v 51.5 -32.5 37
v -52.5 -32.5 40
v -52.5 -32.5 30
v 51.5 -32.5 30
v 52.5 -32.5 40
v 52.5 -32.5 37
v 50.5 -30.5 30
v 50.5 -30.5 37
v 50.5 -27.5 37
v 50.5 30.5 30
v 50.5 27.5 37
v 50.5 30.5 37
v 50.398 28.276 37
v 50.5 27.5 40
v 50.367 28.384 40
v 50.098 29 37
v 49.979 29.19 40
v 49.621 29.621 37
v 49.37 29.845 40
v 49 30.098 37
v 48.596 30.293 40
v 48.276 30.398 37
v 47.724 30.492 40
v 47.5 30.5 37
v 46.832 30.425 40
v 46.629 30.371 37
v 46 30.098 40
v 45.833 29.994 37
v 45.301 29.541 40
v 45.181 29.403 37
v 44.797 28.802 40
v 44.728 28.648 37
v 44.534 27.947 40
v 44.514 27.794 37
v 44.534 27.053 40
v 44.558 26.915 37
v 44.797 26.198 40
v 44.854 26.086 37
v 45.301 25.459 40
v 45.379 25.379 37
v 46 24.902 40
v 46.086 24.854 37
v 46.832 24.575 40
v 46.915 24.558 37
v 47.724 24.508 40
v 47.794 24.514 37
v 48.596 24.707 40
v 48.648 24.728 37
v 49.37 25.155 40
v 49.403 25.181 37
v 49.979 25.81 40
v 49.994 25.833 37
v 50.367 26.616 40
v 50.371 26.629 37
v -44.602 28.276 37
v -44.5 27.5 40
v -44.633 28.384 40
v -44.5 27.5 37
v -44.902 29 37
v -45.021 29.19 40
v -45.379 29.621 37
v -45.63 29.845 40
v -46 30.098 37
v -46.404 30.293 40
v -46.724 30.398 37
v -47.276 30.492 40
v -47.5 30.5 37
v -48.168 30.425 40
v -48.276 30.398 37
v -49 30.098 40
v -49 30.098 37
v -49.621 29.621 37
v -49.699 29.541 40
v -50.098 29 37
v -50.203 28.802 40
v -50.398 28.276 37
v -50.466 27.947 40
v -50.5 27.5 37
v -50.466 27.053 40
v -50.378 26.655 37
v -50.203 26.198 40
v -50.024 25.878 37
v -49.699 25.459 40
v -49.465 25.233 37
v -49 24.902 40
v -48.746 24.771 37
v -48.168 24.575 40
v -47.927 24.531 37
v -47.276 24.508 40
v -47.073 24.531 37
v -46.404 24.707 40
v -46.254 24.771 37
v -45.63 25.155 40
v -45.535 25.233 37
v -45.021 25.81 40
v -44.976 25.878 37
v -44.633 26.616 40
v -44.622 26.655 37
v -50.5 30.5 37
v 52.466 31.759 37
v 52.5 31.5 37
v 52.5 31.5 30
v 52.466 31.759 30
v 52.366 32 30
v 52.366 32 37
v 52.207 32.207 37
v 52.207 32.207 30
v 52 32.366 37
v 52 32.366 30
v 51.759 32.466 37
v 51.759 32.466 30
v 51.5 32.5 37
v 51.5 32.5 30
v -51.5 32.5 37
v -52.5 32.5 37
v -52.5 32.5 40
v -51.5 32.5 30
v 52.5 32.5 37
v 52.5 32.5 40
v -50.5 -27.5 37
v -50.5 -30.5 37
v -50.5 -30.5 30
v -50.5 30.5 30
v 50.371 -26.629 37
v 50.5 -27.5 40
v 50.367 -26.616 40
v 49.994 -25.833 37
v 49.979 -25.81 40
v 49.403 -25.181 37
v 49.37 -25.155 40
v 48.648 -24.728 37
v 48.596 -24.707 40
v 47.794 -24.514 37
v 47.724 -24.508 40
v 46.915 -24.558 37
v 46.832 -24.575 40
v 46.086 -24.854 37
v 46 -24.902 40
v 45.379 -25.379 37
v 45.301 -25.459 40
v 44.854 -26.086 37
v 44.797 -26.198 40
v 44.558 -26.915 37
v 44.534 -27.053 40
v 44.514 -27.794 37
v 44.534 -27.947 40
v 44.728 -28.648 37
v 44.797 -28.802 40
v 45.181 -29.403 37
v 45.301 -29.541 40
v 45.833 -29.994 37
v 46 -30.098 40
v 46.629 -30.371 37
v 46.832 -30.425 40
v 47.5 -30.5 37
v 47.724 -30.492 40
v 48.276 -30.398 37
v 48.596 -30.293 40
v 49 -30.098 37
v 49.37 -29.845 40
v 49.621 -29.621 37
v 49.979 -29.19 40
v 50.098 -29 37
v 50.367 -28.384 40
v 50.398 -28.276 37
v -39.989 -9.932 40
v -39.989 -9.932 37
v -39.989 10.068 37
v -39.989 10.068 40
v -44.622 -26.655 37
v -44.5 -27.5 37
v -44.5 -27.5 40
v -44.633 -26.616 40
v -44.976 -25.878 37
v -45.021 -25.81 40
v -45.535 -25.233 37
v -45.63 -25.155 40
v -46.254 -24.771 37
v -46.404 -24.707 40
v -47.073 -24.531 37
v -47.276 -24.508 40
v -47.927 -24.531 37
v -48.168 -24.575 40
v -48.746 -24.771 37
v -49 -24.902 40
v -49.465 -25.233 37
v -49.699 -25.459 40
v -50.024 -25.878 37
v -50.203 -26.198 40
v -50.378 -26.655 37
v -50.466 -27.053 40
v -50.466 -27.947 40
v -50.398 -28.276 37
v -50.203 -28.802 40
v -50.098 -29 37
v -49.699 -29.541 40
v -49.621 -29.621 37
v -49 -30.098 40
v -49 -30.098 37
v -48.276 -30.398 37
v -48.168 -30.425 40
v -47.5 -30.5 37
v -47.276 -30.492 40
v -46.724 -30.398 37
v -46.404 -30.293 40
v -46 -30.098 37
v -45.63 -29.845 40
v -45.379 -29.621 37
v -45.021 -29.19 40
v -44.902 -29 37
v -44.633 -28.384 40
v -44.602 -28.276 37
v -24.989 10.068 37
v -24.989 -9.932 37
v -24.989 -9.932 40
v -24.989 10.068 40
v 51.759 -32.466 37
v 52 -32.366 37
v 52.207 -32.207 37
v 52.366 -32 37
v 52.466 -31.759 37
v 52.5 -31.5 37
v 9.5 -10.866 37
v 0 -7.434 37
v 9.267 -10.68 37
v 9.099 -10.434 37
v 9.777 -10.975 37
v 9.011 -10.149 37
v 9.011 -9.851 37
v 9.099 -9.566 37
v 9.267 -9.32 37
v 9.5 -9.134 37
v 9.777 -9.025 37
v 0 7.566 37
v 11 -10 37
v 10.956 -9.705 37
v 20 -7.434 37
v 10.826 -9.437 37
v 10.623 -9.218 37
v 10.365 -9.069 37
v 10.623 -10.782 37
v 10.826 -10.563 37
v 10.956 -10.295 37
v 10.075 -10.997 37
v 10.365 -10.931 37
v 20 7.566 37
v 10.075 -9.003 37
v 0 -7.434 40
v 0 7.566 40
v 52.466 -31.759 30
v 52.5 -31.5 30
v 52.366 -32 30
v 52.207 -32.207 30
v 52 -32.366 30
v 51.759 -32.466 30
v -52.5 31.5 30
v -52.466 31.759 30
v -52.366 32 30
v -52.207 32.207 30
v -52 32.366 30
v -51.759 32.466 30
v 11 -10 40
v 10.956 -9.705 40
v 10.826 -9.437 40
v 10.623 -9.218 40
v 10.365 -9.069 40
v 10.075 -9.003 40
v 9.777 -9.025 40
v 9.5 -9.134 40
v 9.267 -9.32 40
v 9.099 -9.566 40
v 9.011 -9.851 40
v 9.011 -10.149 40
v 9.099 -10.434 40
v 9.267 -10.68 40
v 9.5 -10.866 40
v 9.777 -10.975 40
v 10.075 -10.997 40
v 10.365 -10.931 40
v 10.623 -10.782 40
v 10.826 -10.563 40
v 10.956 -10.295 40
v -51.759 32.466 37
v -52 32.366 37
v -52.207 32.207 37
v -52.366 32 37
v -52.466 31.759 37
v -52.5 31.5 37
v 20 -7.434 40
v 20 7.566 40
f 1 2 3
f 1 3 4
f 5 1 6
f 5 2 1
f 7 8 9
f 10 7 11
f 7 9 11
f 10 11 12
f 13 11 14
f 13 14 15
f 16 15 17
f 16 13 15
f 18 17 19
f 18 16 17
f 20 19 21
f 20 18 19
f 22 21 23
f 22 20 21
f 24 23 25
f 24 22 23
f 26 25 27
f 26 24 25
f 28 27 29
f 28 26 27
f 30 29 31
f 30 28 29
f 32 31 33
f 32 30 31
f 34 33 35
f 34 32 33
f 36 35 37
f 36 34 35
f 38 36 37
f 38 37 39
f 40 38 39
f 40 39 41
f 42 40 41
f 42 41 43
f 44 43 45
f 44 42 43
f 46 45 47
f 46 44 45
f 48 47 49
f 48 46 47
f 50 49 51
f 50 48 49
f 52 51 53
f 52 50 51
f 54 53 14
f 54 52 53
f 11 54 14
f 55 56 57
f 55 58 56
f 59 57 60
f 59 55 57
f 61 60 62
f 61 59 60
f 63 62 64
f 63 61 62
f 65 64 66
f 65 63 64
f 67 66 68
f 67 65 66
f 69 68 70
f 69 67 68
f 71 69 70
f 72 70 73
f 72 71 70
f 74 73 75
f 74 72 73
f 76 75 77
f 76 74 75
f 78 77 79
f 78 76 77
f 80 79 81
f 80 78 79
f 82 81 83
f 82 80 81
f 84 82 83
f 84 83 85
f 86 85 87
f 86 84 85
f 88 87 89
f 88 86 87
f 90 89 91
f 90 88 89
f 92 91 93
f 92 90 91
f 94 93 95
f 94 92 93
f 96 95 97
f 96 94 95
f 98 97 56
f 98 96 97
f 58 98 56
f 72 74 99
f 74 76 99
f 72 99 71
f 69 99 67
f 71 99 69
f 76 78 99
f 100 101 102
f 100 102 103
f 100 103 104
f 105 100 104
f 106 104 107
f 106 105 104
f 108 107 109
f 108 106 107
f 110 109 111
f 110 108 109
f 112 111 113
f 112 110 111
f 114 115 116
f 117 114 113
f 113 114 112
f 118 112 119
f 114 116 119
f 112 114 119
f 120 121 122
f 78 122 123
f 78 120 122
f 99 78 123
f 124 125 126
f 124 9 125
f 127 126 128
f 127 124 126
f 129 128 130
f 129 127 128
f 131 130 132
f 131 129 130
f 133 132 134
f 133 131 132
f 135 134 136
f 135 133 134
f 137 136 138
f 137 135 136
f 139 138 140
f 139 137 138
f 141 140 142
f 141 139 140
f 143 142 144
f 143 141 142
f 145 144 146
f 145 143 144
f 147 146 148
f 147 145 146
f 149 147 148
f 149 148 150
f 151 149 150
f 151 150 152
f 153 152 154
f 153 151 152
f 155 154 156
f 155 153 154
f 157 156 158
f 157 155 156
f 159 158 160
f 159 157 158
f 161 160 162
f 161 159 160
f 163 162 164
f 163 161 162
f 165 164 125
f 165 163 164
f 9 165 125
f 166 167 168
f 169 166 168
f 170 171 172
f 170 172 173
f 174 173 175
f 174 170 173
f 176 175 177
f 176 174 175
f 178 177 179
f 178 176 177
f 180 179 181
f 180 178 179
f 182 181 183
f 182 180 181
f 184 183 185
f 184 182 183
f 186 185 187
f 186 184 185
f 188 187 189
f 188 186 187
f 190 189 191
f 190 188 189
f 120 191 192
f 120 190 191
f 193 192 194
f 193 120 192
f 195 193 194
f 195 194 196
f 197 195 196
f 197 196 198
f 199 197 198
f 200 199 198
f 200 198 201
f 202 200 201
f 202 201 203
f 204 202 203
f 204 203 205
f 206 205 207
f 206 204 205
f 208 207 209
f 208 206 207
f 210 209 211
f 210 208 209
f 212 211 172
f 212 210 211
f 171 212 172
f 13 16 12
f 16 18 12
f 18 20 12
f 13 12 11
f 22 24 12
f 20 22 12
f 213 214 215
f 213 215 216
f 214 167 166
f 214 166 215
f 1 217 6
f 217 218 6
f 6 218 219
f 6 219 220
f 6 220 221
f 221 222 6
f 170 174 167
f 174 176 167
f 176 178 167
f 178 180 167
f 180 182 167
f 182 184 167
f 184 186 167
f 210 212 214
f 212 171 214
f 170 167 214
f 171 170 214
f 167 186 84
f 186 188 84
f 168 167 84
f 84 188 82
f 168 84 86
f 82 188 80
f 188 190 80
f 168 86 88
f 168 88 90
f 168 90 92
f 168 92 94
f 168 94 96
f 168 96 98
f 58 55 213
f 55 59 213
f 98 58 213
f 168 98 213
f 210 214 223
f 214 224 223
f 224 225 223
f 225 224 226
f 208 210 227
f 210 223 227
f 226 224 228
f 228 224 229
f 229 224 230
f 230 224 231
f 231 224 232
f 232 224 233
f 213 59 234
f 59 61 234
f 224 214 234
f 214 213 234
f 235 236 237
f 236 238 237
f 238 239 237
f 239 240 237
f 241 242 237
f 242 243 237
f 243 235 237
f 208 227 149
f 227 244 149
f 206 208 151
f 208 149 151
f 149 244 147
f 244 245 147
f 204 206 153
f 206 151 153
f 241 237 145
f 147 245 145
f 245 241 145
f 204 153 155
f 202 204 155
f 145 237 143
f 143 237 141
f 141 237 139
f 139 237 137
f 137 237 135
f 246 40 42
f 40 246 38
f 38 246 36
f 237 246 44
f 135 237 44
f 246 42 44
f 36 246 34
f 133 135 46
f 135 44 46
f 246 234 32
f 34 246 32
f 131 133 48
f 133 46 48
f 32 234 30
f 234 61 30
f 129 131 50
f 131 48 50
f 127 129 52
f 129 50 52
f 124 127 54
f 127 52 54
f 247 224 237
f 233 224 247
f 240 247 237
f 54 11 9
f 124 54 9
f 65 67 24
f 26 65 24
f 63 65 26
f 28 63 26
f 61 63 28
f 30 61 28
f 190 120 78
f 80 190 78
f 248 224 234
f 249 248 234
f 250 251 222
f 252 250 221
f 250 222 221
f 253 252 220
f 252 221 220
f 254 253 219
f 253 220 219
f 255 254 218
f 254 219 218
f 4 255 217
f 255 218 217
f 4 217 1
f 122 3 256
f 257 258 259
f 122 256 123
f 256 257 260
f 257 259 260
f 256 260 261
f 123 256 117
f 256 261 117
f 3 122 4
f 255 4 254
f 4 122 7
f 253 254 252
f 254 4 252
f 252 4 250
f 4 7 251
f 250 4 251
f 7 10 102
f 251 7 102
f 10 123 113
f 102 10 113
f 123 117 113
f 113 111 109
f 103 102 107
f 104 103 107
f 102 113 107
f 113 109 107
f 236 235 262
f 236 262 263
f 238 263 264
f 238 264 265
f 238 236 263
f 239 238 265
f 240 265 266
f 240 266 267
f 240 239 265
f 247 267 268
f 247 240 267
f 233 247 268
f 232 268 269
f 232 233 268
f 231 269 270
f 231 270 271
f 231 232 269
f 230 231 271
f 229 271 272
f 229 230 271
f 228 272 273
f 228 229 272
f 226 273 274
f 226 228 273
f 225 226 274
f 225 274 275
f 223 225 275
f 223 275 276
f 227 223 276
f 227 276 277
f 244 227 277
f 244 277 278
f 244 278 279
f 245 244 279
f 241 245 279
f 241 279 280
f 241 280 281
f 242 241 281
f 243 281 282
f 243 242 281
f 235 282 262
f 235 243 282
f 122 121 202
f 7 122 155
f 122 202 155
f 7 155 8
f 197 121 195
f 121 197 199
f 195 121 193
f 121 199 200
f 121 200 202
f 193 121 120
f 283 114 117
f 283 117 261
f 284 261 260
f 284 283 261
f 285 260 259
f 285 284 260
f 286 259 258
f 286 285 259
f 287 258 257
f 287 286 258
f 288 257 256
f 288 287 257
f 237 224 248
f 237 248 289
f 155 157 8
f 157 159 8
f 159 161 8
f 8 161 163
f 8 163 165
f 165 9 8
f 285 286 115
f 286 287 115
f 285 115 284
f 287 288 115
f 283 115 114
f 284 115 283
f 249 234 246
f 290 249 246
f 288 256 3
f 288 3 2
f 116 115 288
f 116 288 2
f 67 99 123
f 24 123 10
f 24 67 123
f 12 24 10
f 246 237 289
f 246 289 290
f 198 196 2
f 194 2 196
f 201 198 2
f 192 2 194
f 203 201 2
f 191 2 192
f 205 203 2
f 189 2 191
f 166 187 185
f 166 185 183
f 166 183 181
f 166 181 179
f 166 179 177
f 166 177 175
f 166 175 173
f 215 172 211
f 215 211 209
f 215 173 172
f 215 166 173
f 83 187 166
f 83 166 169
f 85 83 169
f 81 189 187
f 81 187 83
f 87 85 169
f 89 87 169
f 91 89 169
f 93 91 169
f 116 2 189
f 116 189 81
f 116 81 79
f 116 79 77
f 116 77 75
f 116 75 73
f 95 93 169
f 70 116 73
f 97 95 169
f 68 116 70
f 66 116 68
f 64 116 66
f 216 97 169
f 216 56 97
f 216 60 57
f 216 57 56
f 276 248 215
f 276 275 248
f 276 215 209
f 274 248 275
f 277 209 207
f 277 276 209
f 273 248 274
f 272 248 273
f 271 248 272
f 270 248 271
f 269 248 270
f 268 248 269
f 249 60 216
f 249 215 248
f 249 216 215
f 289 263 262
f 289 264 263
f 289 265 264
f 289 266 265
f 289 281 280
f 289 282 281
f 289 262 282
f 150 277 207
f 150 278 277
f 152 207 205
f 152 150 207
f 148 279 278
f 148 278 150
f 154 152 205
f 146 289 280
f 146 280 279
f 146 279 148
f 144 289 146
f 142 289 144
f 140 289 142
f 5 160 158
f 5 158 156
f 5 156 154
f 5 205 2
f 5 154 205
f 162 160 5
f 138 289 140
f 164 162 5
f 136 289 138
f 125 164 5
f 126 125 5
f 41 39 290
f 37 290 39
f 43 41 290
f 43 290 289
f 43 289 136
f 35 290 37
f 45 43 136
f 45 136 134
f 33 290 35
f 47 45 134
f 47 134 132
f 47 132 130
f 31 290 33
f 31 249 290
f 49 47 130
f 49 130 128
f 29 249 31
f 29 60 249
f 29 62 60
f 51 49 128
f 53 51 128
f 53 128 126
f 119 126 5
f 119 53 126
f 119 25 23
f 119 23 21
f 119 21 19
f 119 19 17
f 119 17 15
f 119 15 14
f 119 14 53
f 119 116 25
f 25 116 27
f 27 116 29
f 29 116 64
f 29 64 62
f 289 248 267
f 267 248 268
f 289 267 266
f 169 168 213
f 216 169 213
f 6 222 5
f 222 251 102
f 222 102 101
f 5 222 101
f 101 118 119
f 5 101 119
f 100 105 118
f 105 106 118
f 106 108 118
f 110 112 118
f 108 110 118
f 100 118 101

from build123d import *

# Parameters (mm, degrees)
SKETCH007_W   = 105
SKETCH007_H   = 10
PAD006_DEPTH  = 2
FILLET006_R   = 1
SKETCH008_W   = 105
SKETCH008_H   = 10
PAD007_DEPTH  = 2
FILLET012_R   = 1
FILLET014_R   = 1
FILLET023_R   = 1
SKETCH009_W   = 65
SKETCH009_H   = 10
PAD008_DEPTH  = 2
FILLET013_R   = 1
FILLET020_R   = 1
FILLET027_R   = 1
SKETCH010_W   = 65
SKETCH010_H   = 10
PAD009_DEPTH  = 2
FILLET007_R   = 1
FILLET011_R   = 1
FILLET025_R   = 1
SKETCH006_W   = 105
SKETCH006_H   = 65
SKETCH006_R   = 3
SKETCH006_R_2 = 1
SKETCH006_W_2 = 15
SKETCH006_H_2 = 20
SKETCH006_W_3 = 20
SKETCH006_H_3 = 15
PAD005_DEPTH  = 3


with BuildPart() as body006:
    # Sketch007 → Pad006 (new body)
    with BuildSketch(Plane.XZ):
        with Locations((0, 5)):
            Rectangle(SKETCH007_W, SKETCH007_H)
    extrude(amount=PAD006_DEPTH)

    # Fillet006
    fillet006_edges = [body006.edges().sort_by_distance(p)[0] for p in [
        (52.5, -2, 5),
    ]]
    fillet(fillet006_edges, radius=FILLET006_R)


with BuildPart() as body006_1:
    # Body006 placement: moved
    add(body006.part.moved(Location((0, -30.5, 36))))


with BuildPart() as body007:
    # Sketch008 → Pad007 (new body)
    with BuildSketch(Plane.XZ):
        with Locations((0, 5)):
            Rectangle(SKETCH008_W, SKETCH008_H)
    extrude(amount=PAD007_DEPTH)

    # Fillet012
    fillet012_edges = [body007.edges().sort_by_distance(p)[0] for p in [
        (52.5, 0, 5),
    ]]
    fillet(fillet012_edges, radius=FILLET012_R)

    # Fillet014
    fillet014_edges = [body007.edges().sort_by_distance(p)[0] for p in [
        (-52.5, 0, 5),
    ]]
    fillet(fillet014_edges, radius=FILLET014_R)

    # Fillet023
    fillet023_edges = [body007.edges().sort_by_distance(p)[0] for p in [
        (0, 0, 10),
    ]]
    fillet(fillet023_edges, radius=FILLET023_R)


with BuildPart() as body007_1:
    # Body007 placement: moved
    add(body007.part.moved(Location((0, 32.5, 36))))


with BuildPart() as body008:
    # Sketch009 → Pad008 (new body)
    with BuildSketch(Plane.YZ):
        with Locations((0, 5)):
            Rectangle(SKETCH009_W, SKETCH009_H)
    extrude(amount=PAD008_DEPTH)

    # Fillet013
    fillet013_edges = [body008.edges().sort_by_distance(p)[0] for p in [
        (0, 32.5, 5),
    ]]
    fillet(fillet013_edges, radius=FILLET013_R)

    # Fillet020
    fillet020_edges = [body008.edges().sort_by_distance(p)[0] for p in [
        (0, -32.5, 5),
    ]]
    fillet(fillet020_edges, radius=FILLET020_R)

    # Fillet027
    fillet027_edges = [body008.edges().sort_by_distance(p)[0] for p in [
        (0, 0, 10),
    ]]
    fillet(fillet027_edges, radius=FILLET027_R)


with BuildPart() as body008_1:
    # Body008 placement: moved
    add(body008.part.moved(Location((-52.5, 0, 36))))


with BuildPart() as body009:
    # Sketch010 → Pad009 (new body)
    with BuildSketch(Plane.YZ):
        with Locations((0, 5)):
            Rectangle(SKETCH010_W, SKETCH010_H)
    extrude(amount=PAD009_DEPTH)

    # Fillet007
    fillet007_edges = [body009.edges().sort_by_distance(p)[0] for p in [
        (2, -32.5, 5),
    ]]
    fillet(fillet007_edges, radius=FILLET007_R)

    # Fillet011
    fillet011_edges = [body009.edges().sort_by_distance(p)[0] for p in [
        (2, 32.5, 5),
    ]]
    fillet(fillet011_edges, radius=FILLET011_R)

    # Fillet025
    fillet025_edges = [body009.edges().sort_by_distance(p)[0] for p in [
        (2, 0, 10),
    ]]
    fillet(fillet025_edges, radius=FILLET025_R)


with BuildPart() as body009_1:
    # Body009 placement: moved
    add(body009.part.moved(Location((50.5, 0, 36))))


with BuildPart() as fusion:
    # Sketch006 → Pad005 (new body)
    with BuildSketch(Plane.XY):
        Rectangle(SKETCH006_W, SKETCH006_H)
        with Locations((-47.5, 27.5)):
            Circle(SKETCH006_R, mode=Mode.SUBTRACT)
        with Locations((47.5, 27.5)):
            Circle(SKETCH006_R, mode=Mode.SUBTRACT)
        with Locations((-47.5, -27.5)):
            Circle(SKETCH006_R, mode=Mode.SUBTRACT)
        with Locations((47.5, -27.5)):
            Circle(SKETCH006_R, mode=Mode.SUBTRACT)
        with Locations((10, -10)):
            Circle(SKETCH006_R_2, mode=Mode.SUBTRACT)
        with Locations((-32.489298, 0.067564)):
            Rectangle(SKETCH006_W_2, SKETCH006_H_2, mode=Mode.SUBTRACT)
        with Locations((10, 0.066365)):
            Rectangle(SKETCH006_W_3, SKETCH006_H_3, mode=Mode.SUBTRACT)
    extrude(amount=PAD005_DEPTH)


with BuildPart() as fusion_1:
    # Body005 placement: moved
    add(fusion.part.moved(Location((0, 0, 43))))

    # Fusion: union Body006, Body007, Body008, Body009
    add(body006_1.part)
    add(body007_1.part)
    add(body008_1.part)
    add(body009_1.part)


with BuildPart() as fusion_2:
    # Fusion placement: moved
    add(fusion_1.part.moved(Location((0, 0, -6))))


solid = fusion_2.part
